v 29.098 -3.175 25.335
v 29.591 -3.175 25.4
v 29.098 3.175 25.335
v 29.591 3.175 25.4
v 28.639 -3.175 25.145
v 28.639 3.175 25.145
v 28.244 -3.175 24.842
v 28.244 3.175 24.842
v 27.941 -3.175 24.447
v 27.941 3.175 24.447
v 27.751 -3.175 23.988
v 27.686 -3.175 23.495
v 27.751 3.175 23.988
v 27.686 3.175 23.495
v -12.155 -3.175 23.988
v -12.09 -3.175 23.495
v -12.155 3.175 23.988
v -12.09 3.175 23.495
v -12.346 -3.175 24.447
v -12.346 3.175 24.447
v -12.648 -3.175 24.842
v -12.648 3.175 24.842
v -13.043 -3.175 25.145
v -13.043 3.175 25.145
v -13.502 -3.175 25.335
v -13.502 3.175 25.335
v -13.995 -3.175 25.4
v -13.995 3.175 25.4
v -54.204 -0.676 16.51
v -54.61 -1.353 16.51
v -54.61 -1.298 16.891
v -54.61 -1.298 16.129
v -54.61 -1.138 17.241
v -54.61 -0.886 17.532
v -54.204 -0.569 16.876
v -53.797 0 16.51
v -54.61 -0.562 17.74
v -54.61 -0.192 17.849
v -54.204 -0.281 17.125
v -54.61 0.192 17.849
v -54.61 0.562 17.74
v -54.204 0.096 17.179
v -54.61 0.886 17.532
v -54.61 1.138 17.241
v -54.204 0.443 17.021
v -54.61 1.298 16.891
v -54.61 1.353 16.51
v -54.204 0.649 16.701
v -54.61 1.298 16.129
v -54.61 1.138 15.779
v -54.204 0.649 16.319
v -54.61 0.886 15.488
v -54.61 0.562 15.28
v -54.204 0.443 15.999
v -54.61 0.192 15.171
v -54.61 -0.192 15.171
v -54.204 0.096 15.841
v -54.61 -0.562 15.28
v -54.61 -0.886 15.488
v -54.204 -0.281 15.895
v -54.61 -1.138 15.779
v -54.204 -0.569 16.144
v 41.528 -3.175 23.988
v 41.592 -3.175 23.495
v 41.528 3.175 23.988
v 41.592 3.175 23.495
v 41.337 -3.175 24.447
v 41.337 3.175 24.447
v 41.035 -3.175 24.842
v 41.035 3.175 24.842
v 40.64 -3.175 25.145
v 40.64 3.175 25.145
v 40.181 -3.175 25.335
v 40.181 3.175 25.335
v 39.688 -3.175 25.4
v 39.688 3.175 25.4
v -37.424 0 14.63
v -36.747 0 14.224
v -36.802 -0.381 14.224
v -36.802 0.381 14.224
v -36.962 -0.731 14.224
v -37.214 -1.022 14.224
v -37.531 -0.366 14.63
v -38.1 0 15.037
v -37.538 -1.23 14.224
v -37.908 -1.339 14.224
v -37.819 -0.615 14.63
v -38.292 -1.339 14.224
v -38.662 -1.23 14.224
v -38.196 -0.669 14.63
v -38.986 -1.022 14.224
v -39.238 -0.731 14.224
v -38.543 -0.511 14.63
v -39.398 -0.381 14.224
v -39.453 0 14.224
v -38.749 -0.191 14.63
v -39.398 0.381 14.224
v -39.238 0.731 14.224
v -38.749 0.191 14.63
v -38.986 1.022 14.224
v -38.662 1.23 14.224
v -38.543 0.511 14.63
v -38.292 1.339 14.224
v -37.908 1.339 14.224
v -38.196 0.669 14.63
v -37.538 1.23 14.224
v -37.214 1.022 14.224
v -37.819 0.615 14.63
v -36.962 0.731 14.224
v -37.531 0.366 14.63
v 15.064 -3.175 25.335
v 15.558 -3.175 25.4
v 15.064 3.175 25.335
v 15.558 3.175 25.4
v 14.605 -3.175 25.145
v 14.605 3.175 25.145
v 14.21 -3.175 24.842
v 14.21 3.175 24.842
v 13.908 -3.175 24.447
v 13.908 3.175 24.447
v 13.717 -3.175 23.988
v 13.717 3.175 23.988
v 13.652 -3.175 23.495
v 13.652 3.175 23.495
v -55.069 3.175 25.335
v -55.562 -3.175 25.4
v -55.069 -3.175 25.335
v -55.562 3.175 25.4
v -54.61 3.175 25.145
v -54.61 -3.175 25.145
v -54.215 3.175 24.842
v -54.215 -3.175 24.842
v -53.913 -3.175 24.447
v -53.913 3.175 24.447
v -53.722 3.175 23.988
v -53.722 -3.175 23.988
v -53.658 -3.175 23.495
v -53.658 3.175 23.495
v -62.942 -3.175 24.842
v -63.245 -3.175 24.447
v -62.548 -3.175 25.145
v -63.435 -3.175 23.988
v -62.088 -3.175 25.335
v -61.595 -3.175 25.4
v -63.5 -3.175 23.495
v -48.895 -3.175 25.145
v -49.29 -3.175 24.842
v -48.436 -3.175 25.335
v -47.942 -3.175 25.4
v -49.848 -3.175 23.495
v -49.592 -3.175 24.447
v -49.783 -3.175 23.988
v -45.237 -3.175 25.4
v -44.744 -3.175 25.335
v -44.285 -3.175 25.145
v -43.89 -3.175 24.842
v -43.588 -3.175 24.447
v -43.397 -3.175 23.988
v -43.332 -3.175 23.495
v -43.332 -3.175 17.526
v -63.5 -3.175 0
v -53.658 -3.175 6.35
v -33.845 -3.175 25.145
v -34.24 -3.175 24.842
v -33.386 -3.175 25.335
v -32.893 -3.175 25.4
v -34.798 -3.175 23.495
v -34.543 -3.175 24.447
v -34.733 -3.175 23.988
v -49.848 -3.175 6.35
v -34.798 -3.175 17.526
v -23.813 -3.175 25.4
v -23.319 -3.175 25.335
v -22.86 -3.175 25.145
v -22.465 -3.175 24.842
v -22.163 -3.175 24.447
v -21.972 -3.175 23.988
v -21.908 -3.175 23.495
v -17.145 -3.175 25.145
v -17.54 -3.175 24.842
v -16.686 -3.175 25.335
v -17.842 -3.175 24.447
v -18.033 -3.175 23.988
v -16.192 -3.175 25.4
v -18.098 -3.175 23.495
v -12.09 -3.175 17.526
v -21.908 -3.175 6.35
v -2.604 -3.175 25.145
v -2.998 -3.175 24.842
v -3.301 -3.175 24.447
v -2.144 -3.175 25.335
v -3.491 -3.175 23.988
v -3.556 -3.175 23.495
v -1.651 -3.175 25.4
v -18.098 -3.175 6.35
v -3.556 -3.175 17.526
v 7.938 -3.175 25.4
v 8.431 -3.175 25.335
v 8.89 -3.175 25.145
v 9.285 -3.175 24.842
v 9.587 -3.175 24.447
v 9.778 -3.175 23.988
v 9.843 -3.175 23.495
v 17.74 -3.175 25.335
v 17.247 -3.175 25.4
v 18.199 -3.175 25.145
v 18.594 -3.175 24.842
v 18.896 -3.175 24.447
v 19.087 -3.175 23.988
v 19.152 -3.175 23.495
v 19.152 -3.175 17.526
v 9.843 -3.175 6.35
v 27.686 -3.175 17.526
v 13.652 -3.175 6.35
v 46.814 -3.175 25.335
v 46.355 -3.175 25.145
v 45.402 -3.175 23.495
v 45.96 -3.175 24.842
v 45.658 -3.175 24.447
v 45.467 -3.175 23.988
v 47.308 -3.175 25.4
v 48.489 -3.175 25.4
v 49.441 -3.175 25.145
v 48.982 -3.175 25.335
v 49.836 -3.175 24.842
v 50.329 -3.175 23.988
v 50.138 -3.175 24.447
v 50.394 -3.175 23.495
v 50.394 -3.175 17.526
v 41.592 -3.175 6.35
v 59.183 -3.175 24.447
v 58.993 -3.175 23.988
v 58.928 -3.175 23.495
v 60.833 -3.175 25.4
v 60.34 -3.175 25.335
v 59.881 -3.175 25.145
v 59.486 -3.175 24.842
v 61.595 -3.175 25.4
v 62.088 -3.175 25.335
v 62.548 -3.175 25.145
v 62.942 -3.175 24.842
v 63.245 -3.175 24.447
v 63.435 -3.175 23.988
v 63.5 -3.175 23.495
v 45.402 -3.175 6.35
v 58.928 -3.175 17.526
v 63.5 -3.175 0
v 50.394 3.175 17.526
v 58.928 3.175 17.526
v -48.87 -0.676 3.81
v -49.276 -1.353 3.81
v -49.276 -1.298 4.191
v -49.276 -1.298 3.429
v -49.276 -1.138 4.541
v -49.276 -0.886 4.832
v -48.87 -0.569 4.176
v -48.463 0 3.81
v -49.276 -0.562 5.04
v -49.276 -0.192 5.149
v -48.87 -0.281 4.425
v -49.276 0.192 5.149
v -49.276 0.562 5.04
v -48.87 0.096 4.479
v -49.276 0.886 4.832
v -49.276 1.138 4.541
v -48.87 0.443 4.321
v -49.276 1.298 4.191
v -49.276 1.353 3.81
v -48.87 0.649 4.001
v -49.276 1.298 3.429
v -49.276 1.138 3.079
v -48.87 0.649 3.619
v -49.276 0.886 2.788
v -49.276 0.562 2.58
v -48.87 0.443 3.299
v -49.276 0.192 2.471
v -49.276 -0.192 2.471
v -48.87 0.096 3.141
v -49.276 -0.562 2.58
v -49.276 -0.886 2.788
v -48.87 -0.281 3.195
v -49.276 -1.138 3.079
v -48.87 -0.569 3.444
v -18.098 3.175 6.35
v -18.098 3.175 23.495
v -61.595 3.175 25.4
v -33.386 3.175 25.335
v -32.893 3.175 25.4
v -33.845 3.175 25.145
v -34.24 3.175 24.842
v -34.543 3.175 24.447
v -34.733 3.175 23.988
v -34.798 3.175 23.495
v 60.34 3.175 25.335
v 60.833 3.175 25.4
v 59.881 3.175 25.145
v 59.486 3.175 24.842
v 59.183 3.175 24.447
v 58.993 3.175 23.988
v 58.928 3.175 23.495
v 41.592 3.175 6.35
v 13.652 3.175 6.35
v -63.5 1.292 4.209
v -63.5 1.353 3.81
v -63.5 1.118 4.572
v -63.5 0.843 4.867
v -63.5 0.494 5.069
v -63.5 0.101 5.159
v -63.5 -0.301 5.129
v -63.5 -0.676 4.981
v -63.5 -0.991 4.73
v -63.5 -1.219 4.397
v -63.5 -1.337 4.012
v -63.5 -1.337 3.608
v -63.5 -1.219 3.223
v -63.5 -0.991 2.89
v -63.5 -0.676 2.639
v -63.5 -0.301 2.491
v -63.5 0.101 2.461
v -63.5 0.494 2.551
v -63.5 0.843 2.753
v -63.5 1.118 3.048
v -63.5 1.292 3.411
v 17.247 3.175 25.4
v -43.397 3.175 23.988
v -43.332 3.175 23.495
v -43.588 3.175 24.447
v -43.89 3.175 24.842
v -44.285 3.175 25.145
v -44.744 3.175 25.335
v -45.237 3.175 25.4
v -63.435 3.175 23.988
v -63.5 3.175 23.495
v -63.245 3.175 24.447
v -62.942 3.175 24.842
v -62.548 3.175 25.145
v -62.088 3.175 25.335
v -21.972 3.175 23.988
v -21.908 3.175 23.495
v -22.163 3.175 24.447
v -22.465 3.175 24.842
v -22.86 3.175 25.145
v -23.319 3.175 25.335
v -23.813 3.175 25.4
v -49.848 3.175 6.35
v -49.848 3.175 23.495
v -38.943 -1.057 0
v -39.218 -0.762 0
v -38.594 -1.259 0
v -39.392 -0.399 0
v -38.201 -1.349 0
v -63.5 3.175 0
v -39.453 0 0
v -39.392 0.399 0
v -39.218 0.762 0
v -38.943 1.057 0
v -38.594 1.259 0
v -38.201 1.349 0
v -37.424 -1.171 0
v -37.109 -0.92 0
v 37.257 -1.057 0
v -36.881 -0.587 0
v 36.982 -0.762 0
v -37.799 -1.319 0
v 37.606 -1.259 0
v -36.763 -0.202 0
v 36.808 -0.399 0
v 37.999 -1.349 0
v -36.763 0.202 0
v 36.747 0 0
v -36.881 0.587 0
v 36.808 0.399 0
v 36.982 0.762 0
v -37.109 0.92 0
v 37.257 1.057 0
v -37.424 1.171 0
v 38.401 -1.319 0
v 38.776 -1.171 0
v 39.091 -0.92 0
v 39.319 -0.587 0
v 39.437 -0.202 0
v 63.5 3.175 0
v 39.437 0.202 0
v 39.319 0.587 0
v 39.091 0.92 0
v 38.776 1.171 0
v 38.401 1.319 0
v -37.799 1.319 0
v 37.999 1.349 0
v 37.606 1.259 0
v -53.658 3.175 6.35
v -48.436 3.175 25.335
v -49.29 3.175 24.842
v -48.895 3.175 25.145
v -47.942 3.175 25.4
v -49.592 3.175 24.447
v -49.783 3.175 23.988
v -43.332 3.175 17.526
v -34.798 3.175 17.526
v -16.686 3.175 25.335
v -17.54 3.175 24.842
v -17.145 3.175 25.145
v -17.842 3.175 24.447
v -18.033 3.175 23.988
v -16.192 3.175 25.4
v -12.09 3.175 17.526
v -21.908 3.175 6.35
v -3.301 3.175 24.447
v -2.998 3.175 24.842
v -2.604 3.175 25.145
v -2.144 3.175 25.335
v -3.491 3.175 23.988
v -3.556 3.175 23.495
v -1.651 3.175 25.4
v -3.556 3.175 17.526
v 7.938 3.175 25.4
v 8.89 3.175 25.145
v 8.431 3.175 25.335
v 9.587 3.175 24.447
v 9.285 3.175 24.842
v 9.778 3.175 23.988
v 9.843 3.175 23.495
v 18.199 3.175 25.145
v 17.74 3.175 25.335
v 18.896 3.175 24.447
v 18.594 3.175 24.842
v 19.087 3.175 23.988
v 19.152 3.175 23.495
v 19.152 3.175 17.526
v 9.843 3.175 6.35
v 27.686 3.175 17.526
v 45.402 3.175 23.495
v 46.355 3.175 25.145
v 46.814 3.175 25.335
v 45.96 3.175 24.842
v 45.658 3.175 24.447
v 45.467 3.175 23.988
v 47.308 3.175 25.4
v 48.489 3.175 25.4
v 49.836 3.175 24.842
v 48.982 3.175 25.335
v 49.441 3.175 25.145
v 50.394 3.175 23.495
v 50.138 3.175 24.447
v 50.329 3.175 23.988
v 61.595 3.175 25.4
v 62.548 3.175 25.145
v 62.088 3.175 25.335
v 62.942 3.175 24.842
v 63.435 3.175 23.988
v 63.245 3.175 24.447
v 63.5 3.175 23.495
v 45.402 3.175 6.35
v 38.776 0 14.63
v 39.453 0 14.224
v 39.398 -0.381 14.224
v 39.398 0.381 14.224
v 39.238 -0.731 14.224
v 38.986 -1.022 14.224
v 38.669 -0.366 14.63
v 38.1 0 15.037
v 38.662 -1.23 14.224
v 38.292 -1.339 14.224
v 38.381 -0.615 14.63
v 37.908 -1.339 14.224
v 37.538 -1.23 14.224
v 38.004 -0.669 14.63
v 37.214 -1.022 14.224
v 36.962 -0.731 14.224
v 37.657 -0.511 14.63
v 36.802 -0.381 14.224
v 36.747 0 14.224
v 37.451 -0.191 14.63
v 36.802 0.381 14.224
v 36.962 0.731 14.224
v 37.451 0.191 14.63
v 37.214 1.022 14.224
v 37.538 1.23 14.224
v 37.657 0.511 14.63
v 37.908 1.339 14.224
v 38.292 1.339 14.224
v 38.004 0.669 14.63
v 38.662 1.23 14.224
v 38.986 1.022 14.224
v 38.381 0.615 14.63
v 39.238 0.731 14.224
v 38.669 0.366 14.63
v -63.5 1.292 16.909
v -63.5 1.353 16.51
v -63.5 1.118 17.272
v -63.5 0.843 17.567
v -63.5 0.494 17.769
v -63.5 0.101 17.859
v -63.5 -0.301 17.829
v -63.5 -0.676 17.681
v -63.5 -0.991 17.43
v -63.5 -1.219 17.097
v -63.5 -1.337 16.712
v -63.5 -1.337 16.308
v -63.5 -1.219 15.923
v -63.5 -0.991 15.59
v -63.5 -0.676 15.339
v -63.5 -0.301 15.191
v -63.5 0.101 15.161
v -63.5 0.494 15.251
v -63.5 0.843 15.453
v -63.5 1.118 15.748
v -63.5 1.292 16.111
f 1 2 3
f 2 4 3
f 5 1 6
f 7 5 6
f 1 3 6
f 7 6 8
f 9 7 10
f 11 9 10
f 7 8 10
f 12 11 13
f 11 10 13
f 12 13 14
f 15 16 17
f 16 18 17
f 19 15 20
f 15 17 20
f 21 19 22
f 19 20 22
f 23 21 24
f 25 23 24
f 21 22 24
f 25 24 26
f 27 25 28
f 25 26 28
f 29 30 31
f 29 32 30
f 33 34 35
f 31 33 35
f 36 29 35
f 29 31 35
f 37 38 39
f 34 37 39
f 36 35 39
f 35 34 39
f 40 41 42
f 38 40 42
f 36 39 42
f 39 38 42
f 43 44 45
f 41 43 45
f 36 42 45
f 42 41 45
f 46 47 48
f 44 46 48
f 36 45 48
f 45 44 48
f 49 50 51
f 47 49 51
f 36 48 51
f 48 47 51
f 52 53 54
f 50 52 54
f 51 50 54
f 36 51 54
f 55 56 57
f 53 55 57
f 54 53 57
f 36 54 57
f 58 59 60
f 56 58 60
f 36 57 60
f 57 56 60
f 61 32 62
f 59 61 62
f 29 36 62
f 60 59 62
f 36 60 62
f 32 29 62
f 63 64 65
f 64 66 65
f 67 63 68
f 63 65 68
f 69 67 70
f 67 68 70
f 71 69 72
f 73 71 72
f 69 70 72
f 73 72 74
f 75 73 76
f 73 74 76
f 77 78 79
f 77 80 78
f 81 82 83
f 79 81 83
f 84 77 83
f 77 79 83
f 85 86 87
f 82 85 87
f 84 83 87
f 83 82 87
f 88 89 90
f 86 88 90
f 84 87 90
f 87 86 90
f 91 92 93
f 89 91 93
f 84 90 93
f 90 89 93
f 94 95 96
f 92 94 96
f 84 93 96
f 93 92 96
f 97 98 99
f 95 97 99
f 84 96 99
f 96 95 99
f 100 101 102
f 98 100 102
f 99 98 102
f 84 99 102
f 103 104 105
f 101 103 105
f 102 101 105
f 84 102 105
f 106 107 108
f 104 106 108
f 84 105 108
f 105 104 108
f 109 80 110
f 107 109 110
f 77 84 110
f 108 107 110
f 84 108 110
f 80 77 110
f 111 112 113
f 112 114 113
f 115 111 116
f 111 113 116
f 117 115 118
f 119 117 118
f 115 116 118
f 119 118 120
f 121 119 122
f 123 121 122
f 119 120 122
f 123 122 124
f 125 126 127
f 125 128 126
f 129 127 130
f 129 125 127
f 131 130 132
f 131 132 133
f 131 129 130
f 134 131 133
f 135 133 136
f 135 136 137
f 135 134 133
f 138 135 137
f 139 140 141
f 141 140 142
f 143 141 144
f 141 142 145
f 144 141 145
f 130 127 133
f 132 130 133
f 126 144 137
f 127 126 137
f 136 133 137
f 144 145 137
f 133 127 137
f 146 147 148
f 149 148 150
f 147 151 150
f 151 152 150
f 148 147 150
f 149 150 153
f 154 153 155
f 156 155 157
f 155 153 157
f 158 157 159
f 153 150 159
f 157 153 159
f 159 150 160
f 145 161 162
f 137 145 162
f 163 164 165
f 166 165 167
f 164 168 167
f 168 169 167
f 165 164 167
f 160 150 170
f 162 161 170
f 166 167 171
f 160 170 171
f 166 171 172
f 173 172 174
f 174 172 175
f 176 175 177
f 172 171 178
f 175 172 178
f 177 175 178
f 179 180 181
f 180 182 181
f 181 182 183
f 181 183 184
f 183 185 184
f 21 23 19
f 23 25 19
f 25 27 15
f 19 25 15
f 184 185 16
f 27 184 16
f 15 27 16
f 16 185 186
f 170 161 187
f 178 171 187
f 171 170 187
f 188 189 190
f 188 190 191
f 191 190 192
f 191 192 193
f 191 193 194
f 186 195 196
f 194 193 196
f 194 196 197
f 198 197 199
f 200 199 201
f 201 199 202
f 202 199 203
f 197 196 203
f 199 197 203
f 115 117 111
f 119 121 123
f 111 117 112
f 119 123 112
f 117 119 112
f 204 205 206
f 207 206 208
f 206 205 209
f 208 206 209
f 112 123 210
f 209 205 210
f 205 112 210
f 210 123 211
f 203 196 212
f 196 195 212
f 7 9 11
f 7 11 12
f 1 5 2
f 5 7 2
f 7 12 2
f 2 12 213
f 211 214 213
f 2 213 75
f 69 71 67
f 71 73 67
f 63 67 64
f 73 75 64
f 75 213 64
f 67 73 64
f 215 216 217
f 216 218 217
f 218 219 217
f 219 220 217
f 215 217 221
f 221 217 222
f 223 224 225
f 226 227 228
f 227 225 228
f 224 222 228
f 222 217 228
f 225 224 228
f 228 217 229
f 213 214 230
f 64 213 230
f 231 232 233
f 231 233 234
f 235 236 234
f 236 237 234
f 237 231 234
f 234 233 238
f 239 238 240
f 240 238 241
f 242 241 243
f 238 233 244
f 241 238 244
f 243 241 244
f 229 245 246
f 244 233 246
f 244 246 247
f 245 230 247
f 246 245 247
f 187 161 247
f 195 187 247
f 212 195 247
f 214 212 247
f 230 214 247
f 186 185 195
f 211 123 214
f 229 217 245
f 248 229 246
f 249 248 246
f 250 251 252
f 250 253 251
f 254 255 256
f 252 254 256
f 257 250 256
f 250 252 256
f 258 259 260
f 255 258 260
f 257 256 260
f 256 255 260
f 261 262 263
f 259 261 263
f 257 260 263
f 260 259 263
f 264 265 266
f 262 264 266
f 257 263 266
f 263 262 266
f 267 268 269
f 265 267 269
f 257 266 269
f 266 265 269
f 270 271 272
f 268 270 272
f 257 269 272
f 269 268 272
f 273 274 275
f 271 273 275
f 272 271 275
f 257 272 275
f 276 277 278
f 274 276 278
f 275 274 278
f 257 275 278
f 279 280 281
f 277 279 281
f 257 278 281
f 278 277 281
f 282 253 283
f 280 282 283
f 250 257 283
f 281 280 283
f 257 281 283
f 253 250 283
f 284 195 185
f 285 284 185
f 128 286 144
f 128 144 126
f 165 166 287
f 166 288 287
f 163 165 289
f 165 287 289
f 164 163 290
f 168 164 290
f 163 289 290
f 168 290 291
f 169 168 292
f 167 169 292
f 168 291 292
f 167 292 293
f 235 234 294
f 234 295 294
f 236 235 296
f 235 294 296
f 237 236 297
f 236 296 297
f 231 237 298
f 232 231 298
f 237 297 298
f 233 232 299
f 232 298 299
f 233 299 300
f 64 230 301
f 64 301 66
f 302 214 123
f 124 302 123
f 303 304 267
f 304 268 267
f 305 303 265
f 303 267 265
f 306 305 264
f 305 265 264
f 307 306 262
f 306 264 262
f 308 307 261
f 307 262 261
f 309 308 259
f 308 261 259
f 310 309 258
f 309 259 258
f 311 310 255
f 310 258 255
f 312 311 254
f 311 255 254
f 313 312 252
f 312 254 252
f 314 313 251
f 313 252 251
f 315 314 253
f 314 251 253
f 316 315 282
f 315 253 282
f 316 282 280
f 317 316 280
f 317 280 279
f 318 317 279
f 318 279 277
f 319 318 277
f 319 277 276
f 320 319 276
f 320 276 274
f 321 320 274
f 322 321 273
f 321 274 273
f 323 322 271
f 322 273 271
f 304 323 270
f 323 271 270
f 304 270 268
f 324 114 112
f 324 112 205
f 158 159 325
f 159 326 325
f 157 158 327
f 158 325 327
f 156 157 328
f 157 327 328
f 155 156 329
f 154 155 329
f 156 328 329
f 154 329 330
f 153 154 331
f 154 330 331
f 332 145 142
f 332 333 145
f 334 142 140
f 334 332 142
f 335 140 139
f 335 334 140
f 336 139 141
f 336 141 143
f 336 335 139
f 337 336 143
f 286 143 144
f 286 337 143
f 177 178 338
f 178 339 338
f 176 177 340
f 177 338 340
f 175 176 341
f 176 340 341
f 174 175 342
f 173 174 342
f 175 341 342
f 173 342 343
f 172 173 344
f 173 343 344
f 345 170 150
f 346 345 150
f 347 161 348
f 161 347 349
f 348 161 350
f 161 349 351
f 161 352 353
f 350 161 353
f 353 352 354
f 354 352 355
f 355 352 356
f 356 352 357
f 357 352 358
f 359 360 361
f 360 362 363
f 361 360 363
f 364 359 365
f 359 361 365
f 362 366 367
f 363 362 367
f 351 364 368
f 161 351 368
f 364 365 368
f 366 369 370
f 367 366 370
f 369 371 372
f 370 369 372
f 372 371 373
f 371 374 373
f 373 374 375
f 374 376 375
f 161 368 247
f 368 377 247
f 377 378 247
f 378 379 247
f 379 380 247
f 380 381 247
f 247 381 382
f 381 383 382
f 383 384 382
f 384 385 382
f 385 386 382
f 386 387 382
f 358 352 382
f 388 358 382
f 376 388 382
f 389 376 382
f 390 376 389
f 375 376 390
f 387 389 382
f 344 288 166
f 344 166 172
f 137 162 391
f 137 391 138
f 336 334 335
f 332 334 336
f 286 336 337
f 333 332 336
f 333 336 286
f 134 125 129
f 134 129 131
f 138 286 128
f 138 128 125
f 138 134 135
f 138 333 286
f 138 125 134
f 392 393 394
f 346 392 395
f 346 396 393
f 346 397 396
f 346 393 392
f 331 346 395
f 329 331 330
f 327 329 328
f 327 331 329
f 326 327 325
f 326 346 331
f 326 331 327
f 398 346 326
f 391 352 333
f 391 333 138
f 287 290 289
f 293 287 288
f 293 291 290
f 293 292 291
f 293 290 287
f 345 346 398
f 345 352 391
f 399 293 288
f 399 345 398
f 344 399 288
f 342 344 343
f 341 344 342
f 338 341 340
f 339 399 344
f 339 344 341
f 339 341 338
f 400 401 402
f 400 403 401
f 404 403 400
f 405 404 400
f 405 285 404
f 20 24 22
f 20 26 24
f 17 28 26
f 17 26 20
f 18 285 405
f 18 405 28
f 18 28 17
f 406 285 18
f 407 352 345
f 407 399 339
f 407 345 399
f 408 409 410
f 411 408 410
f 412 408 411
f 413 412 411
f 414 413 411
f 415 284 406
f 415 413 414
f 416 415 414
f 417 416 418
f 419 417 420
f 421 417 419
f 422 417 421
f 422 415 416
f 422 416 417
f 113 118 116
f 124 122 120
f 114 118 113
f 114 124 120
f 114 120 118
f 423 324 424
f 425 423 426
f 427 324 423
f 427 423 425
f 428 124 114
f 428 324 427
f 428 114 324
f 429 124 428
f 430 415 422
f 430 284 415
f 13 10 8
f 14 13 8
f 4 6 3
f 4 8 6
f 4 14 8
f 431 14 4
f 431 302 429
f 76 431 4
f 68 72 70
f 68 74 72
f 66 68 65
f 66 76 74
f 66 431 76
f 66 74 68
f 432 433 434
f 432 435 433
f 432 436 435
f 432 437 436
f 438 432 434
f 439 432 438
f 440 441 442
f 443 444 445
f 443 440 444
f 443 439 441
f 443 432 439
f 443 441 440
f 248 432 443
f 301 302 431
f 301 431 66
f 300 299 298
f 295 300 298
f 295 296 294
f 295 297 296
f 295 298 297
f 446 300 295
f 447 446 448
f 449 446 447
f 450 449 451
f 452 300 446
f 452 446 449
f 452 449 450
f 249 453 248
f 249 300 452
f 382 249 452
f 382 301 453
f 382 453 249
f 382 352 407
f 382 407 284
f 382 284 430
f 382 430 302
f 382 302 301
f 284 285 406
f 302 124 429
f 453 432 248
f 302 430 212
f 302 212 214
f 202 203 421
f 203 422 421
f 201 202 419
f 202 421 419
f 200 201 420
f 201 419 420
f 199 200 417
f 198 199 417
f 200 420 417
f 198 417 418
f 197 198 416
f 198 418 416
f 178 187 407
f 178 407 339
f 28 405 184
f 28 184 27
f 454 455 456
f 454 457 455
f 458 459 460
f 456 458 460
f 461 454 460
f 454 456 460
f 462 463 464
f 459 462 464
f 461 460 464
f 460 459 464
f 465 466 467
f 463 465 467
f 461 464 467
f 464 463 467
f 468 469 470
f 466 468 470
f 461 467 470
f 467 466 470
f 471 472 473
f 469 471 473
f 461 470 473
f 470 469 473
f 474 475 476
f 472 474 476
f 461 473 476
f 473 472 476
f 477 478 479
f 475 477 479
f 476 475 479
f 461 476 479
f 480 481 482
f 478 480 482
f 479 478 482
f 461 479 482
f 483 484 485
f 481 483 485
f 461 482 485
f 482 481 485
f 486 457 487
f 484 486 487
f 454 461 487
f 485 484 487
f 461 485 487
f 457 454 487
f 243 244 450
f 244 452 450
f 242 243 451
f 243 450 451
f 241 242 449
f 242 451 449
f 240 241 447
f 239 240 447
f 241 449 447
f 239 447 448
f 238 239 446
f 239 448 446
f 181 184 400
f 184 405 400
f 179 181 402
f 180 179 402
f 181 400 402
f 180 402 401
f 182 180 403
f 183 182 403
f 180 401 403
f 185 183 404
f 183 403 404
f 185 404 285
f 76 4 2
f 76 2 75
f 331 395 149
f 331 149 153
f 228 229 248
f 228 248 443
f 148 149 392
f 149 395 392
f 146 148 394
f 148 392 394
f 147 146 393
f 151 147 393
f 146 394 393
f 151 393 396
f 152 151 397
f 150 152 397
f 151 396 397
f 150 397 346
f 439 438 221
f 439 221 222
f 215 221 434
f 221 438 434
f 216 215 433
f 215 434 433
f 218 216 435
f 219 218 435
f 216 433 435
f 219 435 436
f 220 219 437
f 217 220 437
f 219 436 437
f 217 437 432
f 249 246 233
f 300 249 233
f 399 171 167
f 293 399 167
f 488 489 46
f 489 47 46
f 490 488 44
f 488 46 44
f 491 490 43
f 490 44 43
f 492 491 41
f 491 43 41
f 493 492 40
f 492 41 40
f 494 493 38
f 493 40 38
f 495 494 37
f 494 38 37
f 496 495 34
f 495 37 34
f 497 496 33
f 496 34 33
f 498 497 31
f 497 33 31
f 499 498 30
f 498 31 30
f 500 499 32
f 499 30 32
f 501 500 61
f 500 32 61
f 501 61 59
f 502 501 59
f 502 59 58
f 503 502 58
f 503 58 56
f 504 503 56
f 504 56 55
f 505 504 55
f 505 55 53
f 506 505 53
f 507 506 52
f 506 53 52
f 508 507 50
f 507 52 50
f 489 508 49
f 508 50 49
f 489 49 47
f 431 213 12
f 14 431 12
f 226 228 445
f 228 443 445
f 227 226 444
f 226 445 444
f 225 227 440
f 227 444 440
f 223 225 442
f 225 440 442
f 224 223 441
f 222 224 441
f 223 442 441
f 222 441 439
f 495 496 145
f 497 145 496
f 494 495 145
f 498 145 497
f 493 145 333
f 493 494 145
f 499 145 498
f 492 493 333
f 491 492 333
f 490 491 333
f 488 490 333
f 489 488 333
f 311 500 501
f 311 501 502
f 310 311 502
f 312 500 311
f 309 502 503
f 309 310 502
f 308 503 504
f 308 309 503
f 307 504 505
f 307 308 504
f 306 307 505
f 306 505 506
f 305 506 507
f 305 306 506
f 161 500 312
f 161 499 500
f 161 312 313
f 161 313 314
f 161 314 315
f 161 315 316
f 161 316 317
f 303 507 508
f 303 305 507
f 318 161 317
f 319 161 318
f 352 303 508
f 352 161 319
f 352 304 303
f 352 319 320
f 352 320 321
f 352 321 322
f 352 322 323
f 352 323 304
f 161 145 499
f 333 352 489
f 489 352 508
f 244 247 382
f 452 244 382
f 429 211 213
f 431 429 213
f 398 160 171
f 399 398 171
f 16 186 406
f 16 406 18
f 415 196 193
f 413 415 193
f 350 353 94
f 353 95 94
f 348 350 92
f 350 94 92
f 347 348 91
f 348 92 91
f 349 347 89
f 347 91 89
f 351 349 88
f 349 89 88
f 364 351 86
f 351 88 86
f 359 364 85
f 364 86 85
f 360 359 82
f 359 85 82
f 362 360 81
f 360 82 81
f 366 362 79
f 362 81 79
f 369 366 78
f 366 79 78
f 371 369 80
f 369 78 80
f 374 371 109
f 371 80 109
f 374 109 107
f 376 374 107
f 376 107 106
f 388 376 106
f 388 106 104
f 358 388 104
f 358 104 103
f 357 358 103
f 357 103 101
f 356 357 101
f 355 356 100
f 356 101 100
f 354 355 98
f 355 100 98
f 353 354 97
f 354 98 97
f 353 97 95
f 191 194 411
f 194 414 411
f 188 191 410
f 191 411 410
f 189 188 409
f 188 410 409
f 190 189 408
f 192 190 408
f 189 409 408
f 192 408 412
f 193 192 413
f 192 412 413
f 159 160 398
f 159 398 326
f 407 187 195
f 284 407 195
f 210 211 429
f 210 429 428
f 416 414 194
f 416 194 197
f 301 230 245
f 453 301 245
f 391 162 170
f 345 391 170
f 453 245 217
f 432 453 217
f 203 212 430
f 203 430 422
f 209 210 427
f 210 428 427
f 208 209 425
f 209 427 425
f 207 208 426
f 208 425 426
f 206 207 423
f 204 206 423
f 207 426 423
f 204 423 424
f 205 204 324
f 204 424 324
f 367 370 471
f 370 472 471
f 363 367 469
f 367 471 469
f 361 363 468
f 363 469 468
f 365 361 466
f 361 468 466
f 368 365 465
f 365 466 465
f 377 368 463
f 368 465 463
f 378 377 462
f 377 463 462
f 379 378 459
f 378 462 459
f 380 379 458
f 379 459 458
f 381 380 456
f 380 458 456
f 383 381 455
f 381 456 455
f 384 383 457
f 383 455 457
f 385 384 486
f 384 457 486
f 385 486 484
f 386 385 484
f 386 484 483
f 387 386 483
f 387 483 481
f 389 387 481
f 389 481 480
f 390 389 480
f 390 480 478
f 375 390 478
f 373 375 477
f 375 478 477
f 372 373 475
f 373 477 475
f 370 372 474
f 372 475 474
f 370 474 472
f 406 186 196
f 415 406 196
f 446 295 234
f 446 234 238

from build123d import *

# Parameters (mm, degrees)
F0_W           = 127
F0_H           = 6.35
F1_DEPTH       = 25.4
F2_W           = 3.81
F2_H           = 19.05
F2_W_2         = 8.5344
F2_H_2         = 7.874
F3_DEPTH       = 6.35
F4_R           = 1.905
F7_D           = 2.7051
F7_DEPTH       = 14.224
F7_TIP         = 0.8126940303
F7_ON_F6_D     = 2.7051
F7_ON_F6_DEPTH = 14.224
F7_ON_F6_TIP   = 0.8126940303
F8_D           = 2.7051
F8_DEPTH       = 8.89
F8_TIP         = 0.8126940303


with BuildPart() as f1:
    # F0 (on Top) → F1 (new body)
    with BuildSketch(Plane.XY):
        Rectangle(F0_W, F0_H)
    extrude(amount=F1_DEPTH)

    # F2 (on face) → F3 (cut, through all)
    with BuildSketch(Plane.XZ.offset(3.175)):
        with Locations((-51.7525, 15.875)):
            Rectangle(F2_W, F2_H)
        with Locations((-20.0025, 15.875)):
            Rectangle(F2_W, F2_H)
        with Locations((11.7475, 15.875)):
            Rectangle(F2_W, F2_H)
        with Locations((43.4975, 15.875)):
            Rectangle(F2_W, F2_H)
        with Locations((-39.0652, 21.463)):
            Rectangle(F2_W_2, F2_H_2)
        with Locations((-7.8232, 21.463)):
            Rectangle(F2_W_2, F2_H_2)
        with Locations((23.4188, 21.463)):
            Rectangle(F2_W_2, F2_H_2)
        with Locations((54.6608, 21.463)):
            Rectangle(F2_W_2, F2_H_2)
    extrude(amount=-F3_DEPTH, mode=Mode.SUBTRACT)

    # F4
    f4_edges = [f1.edges().sort_by_distance(p)[0] for p in [
        (-53.6575, 0, 25.4),
        (-49.8475, 0, 25.4),
        (-21.9075, 0, 25.4),
        (-18.0975, 0, 25.4),
        (9.8425, 0, 25.4),
        (13.6525, 0, 25.4),
        (41.5925, 0, 25.4),
        (45.4025, 0, 25.4),
        (-43.3324, 0, 25.4),
        (-34.798, 0, 25.4),
        (-12.0904, 0, 25.4),
        (-3.556, 0, 25.4),
        (19.1516, 0, 25.4),
        (27.686, 0, 25.4),
        (50.3936, 0, 25.4),
        (58.928, 0, 25.4),
        (63.5, 0, 25.4),
        (-63.5, 0, 25.4),
    ]]
    fillet(f4_edges, radius=F4_R)

    # F7
    with Locations(Plane(origin=(0, 0, 0), x_dir=(1, 0, 0), z_dir=(0, 0, -1))):
        with Locations((-38.1, 0), (38.1, 0)):
            Hole(F7_D / 2, depth=F7_DEPTH)
            with Locations((0, 0, -(F7_DEPTH + F7_TIP / 2))):  # 118° drill point
                Cone(0, F7_D / 2, F7_TIP, mode=Mode.SUBTRACT)

    # F7 on F6
    with Locations(Plane(origin=(-63.5, 0, 0), x_dir=(0, -1, 0), z_dir=(-1, 0, 0))):
        with Locations((0, 3.81)):
            Hole(F7_ON_F6_D / 2, depth=F7_ON_F6_DEPTH)
            with Locations((0, 0, -(F7_ON_F6_DEPTH + F7_ON_F6_TIP / 2))):  # 118° drill point
                Cone(0, F7_ON_F6_D / 2, F7_ON_F6_TIP, mode=Mode.SUBTRACT)

    # F8
    with Locations(Plane(origin=(-63.5, 0, 0), x_dir=(0, -1, 0), z_dir=(-1, 0, 0))):
        with Locations((0, 16.51)):
            Hole(F8_D / 2, depth=F8_DEPTH)
            with Locations((0, 0, -(F8_DEPTH + F8_TIP / 2))):  # 118° drill point
                Cone(0, F8_D / 2, F8_TIP, mode=Mode.SUBTRACT)


solid = f1.part
